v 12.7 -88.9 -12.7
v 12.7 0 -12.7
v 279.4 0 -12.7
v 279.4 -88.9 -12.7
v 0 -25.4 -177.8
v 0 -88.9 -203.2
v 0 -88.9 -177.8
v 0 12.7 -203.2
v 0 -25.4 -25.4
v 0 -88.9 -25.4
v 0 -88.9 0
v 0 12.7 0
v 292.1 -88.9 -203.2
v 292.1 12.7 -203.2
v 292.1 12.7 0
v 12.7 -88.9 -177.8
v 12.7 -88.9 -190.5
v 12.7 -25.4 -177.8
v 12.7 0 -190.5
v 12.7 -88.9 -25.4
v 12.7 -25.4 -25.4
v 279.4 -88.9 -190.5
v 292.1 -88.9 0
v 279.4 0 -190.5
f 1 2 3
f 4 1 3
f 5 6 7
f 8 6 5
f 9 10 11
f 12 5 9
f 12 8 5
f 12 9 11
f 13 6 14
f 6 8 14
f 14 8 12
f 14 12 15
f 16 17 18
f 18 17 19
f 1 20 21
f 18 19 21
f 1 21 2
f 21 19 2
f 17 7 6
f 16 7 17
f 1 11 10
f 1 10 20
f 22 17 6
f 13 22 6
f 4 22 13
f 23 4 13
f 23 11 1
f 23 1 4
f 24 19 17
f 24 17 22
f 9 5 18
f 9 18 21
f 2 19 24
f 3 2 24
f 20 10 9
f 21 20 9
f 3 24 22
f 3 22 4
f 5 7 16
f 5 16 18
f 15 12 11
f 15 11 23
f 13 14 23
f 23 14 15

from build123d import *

# Parameters (mm, degrees)
SKETCH2_W           = 292.1
SKETCH2_H           = 203.2
BOSS_EXTRUDE1_DEPTH = 12.7
SKETCH3_W           = 292.1
SKETCH3_H           = 203.2
SKETCH3_W_2         = 266.7
SKETCH3_H_2         = 177.8
BOSS_EXTRUDE2_DEPTH = 88.9
CUT_EXTRUDE1_REACH  = 368.764
SKETCH4_W           = 152.4
SKETCH4_H           = 63.5


with BuildPart() as part:
    # Sketch2 → Boss-Extrude1 (new body)
    with BuildSketch(Plane(origin=(0, 0, 0), x_dir=(1, 0, 0), z_dir=(0, 1, 0))):
        with Locations((146.05, 101.6)):
            Rectangle(SKETCH2_W, SKETCH2_H)
    extrude(amount=BOSS_EXTRUDE1_DEPTH)

    # Sketch3 → Boss-Extrude2 (add)
    with BuildSketch(Plane.XZ):
        with Locations((146.05, -101.6)):
            Rectangle(SKETCH3_W, SKETCH3_H)
        with Locations((146.05, -101.6)):
            Rectangle(SKETCH3_W_2, SKETCH3_H_2, mode=Mode.SUBTRACT)
    extrude(amount=BOSS_EXTRUDE2_DEPTH)

    # Sketch4 → Cut-Extrude1 (cut, up to next)
    with BuildSketch(Plane.ZY, mode=Mode.PRIVATE) as cut_extrude1_sk1:
        with Locations((-101.6, -57.15)):
            Rectangle(SKETCH4_W, SKETCH4_H)
    cut_extrude1_tool1 = extrude(cut_extrude1_sk1.sketch, amount=-CUT_EXTRUDE1_REACH, mode=Mode.PRIVATE) & part.part
    add(cut_extrude1_tool1.solids().sort_by_distance((0, -57.15, -101.6))[0], mode=Mode.SUBTRACT)


solid = part.part
